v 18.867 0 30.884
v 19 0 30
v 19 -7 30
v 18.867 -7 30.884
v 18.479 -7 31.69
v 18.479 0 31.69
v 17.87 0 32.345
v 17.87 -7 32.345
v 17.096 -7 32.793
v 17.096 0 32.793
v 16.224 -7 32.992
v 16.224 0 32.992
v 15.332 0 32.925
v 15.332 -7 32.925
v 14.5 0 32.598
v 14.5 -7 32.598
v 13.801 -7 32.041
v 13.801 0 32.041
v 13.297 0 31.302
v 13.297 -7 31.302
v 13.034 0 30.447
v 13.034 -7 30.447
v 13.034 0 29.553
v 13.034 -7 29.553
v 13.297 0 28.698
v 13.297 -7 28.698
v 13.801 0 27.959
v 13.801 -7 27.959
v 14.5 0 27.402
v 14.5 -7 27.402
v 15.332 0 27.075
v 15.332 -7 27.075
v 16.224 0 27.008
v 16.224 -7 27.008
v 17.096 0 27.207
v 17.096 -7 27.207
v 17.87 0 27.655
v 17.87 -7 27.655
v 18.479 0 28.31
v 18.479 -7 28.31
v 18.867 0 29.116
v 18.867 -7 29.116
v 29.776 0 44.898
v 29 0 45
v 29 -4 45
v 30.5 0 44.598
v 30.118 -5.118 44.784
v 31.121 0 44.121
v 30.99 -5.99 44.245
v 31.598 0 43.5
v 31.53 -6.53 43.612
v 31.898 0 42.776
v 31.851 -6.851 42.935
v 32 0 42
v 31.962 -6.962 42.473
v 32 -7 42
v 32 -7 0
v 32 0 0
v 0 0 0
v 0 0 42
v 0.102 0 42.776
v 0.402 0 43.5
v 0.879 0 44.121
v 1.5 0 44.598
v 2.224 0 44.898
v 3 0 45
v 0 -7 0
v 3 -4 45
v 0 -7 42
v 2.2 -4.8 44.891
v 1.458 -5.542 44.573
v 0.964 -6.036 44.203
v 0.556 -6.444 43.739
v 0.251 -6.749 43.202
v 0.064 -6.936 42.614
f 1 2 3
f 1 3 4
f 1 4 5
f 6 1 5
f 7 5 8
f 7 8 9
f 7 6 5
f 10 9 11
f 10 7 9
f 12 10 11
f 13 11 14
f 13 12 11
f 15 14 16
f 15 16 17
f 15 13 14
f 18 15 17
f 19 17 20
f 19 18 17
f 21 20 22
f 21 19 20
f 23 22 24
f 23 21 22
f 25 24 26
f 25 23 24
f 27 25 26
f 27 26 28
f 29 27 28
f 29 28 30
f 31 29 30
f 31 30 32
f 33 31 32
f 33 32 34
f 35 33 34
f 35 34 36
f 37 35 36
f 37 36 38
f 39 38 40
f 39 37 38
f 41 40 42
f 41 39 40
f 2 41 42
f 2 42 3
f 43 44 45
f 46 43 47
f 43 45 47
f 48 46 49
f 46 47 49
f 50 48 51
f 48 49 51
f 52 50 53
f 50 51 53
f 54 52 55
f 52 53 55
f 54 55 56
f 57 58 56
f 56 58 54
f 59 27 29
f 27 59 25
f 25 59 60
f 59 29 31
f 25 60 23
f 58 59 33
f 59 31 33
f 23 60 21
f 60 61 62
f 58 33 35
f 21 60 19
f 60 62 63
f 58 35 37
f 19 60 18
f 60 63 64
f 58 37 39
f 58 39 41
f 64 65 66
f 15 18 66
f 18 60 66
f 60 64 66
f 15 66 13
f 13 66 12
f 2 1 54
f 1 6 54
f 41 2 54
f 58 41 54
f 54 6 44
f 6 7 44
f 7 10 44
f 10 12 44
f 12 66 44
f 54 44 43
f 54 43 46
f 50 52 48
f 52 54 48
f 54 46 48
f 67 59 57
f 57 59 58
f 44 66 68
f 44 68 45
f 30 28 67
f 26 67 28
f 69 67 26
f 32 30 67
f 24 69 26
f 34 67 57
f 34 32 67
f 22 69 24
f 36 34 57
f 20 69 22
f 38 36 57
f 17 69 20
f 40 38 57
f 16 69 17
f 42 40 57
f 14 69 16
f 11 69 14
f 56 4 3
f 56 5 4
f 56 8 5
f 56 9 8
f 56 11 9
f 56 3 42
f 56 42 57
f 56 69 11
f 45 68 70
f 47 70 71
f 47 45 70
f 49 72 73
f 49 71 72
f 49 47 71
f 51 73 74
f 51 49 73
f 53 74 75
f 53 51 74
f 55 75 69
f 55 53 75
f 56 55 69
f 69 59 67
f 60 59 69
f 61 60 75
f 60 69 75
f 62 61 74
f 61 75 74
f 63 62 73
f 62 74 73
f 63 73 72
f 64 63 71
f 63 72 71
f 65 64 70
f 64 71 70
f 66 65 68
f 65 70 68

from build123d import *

# Parameters (mm, degrees)
F0_W     = 32
F0_H     = 45
F0_R     = 3
F1_DEPTH = 7
F2_R     = 3


with BuildPart() as f1:
    # F0 (on Front) → F1 (new body)
    with BuildSketch(Plane.XZ):
        with Locations((16, 22.5)):
            Rectangle(F0_W, F0_H)
        with Locations((16, 30)):
            Circle(F0_R, mode=Mode.SUBTRACT)
    extrude(amount=F1_DEPTH)

    # F2
    f2_edges = [f1.edges().sort_by_distance(p)[0] for p in [
        (32, -3.5, 45),
        (0, -3.5, 45),
        (16, -7, 45),
    ]]
    fillet(f2_edges, radius=F2_R)


solid = f1.part
